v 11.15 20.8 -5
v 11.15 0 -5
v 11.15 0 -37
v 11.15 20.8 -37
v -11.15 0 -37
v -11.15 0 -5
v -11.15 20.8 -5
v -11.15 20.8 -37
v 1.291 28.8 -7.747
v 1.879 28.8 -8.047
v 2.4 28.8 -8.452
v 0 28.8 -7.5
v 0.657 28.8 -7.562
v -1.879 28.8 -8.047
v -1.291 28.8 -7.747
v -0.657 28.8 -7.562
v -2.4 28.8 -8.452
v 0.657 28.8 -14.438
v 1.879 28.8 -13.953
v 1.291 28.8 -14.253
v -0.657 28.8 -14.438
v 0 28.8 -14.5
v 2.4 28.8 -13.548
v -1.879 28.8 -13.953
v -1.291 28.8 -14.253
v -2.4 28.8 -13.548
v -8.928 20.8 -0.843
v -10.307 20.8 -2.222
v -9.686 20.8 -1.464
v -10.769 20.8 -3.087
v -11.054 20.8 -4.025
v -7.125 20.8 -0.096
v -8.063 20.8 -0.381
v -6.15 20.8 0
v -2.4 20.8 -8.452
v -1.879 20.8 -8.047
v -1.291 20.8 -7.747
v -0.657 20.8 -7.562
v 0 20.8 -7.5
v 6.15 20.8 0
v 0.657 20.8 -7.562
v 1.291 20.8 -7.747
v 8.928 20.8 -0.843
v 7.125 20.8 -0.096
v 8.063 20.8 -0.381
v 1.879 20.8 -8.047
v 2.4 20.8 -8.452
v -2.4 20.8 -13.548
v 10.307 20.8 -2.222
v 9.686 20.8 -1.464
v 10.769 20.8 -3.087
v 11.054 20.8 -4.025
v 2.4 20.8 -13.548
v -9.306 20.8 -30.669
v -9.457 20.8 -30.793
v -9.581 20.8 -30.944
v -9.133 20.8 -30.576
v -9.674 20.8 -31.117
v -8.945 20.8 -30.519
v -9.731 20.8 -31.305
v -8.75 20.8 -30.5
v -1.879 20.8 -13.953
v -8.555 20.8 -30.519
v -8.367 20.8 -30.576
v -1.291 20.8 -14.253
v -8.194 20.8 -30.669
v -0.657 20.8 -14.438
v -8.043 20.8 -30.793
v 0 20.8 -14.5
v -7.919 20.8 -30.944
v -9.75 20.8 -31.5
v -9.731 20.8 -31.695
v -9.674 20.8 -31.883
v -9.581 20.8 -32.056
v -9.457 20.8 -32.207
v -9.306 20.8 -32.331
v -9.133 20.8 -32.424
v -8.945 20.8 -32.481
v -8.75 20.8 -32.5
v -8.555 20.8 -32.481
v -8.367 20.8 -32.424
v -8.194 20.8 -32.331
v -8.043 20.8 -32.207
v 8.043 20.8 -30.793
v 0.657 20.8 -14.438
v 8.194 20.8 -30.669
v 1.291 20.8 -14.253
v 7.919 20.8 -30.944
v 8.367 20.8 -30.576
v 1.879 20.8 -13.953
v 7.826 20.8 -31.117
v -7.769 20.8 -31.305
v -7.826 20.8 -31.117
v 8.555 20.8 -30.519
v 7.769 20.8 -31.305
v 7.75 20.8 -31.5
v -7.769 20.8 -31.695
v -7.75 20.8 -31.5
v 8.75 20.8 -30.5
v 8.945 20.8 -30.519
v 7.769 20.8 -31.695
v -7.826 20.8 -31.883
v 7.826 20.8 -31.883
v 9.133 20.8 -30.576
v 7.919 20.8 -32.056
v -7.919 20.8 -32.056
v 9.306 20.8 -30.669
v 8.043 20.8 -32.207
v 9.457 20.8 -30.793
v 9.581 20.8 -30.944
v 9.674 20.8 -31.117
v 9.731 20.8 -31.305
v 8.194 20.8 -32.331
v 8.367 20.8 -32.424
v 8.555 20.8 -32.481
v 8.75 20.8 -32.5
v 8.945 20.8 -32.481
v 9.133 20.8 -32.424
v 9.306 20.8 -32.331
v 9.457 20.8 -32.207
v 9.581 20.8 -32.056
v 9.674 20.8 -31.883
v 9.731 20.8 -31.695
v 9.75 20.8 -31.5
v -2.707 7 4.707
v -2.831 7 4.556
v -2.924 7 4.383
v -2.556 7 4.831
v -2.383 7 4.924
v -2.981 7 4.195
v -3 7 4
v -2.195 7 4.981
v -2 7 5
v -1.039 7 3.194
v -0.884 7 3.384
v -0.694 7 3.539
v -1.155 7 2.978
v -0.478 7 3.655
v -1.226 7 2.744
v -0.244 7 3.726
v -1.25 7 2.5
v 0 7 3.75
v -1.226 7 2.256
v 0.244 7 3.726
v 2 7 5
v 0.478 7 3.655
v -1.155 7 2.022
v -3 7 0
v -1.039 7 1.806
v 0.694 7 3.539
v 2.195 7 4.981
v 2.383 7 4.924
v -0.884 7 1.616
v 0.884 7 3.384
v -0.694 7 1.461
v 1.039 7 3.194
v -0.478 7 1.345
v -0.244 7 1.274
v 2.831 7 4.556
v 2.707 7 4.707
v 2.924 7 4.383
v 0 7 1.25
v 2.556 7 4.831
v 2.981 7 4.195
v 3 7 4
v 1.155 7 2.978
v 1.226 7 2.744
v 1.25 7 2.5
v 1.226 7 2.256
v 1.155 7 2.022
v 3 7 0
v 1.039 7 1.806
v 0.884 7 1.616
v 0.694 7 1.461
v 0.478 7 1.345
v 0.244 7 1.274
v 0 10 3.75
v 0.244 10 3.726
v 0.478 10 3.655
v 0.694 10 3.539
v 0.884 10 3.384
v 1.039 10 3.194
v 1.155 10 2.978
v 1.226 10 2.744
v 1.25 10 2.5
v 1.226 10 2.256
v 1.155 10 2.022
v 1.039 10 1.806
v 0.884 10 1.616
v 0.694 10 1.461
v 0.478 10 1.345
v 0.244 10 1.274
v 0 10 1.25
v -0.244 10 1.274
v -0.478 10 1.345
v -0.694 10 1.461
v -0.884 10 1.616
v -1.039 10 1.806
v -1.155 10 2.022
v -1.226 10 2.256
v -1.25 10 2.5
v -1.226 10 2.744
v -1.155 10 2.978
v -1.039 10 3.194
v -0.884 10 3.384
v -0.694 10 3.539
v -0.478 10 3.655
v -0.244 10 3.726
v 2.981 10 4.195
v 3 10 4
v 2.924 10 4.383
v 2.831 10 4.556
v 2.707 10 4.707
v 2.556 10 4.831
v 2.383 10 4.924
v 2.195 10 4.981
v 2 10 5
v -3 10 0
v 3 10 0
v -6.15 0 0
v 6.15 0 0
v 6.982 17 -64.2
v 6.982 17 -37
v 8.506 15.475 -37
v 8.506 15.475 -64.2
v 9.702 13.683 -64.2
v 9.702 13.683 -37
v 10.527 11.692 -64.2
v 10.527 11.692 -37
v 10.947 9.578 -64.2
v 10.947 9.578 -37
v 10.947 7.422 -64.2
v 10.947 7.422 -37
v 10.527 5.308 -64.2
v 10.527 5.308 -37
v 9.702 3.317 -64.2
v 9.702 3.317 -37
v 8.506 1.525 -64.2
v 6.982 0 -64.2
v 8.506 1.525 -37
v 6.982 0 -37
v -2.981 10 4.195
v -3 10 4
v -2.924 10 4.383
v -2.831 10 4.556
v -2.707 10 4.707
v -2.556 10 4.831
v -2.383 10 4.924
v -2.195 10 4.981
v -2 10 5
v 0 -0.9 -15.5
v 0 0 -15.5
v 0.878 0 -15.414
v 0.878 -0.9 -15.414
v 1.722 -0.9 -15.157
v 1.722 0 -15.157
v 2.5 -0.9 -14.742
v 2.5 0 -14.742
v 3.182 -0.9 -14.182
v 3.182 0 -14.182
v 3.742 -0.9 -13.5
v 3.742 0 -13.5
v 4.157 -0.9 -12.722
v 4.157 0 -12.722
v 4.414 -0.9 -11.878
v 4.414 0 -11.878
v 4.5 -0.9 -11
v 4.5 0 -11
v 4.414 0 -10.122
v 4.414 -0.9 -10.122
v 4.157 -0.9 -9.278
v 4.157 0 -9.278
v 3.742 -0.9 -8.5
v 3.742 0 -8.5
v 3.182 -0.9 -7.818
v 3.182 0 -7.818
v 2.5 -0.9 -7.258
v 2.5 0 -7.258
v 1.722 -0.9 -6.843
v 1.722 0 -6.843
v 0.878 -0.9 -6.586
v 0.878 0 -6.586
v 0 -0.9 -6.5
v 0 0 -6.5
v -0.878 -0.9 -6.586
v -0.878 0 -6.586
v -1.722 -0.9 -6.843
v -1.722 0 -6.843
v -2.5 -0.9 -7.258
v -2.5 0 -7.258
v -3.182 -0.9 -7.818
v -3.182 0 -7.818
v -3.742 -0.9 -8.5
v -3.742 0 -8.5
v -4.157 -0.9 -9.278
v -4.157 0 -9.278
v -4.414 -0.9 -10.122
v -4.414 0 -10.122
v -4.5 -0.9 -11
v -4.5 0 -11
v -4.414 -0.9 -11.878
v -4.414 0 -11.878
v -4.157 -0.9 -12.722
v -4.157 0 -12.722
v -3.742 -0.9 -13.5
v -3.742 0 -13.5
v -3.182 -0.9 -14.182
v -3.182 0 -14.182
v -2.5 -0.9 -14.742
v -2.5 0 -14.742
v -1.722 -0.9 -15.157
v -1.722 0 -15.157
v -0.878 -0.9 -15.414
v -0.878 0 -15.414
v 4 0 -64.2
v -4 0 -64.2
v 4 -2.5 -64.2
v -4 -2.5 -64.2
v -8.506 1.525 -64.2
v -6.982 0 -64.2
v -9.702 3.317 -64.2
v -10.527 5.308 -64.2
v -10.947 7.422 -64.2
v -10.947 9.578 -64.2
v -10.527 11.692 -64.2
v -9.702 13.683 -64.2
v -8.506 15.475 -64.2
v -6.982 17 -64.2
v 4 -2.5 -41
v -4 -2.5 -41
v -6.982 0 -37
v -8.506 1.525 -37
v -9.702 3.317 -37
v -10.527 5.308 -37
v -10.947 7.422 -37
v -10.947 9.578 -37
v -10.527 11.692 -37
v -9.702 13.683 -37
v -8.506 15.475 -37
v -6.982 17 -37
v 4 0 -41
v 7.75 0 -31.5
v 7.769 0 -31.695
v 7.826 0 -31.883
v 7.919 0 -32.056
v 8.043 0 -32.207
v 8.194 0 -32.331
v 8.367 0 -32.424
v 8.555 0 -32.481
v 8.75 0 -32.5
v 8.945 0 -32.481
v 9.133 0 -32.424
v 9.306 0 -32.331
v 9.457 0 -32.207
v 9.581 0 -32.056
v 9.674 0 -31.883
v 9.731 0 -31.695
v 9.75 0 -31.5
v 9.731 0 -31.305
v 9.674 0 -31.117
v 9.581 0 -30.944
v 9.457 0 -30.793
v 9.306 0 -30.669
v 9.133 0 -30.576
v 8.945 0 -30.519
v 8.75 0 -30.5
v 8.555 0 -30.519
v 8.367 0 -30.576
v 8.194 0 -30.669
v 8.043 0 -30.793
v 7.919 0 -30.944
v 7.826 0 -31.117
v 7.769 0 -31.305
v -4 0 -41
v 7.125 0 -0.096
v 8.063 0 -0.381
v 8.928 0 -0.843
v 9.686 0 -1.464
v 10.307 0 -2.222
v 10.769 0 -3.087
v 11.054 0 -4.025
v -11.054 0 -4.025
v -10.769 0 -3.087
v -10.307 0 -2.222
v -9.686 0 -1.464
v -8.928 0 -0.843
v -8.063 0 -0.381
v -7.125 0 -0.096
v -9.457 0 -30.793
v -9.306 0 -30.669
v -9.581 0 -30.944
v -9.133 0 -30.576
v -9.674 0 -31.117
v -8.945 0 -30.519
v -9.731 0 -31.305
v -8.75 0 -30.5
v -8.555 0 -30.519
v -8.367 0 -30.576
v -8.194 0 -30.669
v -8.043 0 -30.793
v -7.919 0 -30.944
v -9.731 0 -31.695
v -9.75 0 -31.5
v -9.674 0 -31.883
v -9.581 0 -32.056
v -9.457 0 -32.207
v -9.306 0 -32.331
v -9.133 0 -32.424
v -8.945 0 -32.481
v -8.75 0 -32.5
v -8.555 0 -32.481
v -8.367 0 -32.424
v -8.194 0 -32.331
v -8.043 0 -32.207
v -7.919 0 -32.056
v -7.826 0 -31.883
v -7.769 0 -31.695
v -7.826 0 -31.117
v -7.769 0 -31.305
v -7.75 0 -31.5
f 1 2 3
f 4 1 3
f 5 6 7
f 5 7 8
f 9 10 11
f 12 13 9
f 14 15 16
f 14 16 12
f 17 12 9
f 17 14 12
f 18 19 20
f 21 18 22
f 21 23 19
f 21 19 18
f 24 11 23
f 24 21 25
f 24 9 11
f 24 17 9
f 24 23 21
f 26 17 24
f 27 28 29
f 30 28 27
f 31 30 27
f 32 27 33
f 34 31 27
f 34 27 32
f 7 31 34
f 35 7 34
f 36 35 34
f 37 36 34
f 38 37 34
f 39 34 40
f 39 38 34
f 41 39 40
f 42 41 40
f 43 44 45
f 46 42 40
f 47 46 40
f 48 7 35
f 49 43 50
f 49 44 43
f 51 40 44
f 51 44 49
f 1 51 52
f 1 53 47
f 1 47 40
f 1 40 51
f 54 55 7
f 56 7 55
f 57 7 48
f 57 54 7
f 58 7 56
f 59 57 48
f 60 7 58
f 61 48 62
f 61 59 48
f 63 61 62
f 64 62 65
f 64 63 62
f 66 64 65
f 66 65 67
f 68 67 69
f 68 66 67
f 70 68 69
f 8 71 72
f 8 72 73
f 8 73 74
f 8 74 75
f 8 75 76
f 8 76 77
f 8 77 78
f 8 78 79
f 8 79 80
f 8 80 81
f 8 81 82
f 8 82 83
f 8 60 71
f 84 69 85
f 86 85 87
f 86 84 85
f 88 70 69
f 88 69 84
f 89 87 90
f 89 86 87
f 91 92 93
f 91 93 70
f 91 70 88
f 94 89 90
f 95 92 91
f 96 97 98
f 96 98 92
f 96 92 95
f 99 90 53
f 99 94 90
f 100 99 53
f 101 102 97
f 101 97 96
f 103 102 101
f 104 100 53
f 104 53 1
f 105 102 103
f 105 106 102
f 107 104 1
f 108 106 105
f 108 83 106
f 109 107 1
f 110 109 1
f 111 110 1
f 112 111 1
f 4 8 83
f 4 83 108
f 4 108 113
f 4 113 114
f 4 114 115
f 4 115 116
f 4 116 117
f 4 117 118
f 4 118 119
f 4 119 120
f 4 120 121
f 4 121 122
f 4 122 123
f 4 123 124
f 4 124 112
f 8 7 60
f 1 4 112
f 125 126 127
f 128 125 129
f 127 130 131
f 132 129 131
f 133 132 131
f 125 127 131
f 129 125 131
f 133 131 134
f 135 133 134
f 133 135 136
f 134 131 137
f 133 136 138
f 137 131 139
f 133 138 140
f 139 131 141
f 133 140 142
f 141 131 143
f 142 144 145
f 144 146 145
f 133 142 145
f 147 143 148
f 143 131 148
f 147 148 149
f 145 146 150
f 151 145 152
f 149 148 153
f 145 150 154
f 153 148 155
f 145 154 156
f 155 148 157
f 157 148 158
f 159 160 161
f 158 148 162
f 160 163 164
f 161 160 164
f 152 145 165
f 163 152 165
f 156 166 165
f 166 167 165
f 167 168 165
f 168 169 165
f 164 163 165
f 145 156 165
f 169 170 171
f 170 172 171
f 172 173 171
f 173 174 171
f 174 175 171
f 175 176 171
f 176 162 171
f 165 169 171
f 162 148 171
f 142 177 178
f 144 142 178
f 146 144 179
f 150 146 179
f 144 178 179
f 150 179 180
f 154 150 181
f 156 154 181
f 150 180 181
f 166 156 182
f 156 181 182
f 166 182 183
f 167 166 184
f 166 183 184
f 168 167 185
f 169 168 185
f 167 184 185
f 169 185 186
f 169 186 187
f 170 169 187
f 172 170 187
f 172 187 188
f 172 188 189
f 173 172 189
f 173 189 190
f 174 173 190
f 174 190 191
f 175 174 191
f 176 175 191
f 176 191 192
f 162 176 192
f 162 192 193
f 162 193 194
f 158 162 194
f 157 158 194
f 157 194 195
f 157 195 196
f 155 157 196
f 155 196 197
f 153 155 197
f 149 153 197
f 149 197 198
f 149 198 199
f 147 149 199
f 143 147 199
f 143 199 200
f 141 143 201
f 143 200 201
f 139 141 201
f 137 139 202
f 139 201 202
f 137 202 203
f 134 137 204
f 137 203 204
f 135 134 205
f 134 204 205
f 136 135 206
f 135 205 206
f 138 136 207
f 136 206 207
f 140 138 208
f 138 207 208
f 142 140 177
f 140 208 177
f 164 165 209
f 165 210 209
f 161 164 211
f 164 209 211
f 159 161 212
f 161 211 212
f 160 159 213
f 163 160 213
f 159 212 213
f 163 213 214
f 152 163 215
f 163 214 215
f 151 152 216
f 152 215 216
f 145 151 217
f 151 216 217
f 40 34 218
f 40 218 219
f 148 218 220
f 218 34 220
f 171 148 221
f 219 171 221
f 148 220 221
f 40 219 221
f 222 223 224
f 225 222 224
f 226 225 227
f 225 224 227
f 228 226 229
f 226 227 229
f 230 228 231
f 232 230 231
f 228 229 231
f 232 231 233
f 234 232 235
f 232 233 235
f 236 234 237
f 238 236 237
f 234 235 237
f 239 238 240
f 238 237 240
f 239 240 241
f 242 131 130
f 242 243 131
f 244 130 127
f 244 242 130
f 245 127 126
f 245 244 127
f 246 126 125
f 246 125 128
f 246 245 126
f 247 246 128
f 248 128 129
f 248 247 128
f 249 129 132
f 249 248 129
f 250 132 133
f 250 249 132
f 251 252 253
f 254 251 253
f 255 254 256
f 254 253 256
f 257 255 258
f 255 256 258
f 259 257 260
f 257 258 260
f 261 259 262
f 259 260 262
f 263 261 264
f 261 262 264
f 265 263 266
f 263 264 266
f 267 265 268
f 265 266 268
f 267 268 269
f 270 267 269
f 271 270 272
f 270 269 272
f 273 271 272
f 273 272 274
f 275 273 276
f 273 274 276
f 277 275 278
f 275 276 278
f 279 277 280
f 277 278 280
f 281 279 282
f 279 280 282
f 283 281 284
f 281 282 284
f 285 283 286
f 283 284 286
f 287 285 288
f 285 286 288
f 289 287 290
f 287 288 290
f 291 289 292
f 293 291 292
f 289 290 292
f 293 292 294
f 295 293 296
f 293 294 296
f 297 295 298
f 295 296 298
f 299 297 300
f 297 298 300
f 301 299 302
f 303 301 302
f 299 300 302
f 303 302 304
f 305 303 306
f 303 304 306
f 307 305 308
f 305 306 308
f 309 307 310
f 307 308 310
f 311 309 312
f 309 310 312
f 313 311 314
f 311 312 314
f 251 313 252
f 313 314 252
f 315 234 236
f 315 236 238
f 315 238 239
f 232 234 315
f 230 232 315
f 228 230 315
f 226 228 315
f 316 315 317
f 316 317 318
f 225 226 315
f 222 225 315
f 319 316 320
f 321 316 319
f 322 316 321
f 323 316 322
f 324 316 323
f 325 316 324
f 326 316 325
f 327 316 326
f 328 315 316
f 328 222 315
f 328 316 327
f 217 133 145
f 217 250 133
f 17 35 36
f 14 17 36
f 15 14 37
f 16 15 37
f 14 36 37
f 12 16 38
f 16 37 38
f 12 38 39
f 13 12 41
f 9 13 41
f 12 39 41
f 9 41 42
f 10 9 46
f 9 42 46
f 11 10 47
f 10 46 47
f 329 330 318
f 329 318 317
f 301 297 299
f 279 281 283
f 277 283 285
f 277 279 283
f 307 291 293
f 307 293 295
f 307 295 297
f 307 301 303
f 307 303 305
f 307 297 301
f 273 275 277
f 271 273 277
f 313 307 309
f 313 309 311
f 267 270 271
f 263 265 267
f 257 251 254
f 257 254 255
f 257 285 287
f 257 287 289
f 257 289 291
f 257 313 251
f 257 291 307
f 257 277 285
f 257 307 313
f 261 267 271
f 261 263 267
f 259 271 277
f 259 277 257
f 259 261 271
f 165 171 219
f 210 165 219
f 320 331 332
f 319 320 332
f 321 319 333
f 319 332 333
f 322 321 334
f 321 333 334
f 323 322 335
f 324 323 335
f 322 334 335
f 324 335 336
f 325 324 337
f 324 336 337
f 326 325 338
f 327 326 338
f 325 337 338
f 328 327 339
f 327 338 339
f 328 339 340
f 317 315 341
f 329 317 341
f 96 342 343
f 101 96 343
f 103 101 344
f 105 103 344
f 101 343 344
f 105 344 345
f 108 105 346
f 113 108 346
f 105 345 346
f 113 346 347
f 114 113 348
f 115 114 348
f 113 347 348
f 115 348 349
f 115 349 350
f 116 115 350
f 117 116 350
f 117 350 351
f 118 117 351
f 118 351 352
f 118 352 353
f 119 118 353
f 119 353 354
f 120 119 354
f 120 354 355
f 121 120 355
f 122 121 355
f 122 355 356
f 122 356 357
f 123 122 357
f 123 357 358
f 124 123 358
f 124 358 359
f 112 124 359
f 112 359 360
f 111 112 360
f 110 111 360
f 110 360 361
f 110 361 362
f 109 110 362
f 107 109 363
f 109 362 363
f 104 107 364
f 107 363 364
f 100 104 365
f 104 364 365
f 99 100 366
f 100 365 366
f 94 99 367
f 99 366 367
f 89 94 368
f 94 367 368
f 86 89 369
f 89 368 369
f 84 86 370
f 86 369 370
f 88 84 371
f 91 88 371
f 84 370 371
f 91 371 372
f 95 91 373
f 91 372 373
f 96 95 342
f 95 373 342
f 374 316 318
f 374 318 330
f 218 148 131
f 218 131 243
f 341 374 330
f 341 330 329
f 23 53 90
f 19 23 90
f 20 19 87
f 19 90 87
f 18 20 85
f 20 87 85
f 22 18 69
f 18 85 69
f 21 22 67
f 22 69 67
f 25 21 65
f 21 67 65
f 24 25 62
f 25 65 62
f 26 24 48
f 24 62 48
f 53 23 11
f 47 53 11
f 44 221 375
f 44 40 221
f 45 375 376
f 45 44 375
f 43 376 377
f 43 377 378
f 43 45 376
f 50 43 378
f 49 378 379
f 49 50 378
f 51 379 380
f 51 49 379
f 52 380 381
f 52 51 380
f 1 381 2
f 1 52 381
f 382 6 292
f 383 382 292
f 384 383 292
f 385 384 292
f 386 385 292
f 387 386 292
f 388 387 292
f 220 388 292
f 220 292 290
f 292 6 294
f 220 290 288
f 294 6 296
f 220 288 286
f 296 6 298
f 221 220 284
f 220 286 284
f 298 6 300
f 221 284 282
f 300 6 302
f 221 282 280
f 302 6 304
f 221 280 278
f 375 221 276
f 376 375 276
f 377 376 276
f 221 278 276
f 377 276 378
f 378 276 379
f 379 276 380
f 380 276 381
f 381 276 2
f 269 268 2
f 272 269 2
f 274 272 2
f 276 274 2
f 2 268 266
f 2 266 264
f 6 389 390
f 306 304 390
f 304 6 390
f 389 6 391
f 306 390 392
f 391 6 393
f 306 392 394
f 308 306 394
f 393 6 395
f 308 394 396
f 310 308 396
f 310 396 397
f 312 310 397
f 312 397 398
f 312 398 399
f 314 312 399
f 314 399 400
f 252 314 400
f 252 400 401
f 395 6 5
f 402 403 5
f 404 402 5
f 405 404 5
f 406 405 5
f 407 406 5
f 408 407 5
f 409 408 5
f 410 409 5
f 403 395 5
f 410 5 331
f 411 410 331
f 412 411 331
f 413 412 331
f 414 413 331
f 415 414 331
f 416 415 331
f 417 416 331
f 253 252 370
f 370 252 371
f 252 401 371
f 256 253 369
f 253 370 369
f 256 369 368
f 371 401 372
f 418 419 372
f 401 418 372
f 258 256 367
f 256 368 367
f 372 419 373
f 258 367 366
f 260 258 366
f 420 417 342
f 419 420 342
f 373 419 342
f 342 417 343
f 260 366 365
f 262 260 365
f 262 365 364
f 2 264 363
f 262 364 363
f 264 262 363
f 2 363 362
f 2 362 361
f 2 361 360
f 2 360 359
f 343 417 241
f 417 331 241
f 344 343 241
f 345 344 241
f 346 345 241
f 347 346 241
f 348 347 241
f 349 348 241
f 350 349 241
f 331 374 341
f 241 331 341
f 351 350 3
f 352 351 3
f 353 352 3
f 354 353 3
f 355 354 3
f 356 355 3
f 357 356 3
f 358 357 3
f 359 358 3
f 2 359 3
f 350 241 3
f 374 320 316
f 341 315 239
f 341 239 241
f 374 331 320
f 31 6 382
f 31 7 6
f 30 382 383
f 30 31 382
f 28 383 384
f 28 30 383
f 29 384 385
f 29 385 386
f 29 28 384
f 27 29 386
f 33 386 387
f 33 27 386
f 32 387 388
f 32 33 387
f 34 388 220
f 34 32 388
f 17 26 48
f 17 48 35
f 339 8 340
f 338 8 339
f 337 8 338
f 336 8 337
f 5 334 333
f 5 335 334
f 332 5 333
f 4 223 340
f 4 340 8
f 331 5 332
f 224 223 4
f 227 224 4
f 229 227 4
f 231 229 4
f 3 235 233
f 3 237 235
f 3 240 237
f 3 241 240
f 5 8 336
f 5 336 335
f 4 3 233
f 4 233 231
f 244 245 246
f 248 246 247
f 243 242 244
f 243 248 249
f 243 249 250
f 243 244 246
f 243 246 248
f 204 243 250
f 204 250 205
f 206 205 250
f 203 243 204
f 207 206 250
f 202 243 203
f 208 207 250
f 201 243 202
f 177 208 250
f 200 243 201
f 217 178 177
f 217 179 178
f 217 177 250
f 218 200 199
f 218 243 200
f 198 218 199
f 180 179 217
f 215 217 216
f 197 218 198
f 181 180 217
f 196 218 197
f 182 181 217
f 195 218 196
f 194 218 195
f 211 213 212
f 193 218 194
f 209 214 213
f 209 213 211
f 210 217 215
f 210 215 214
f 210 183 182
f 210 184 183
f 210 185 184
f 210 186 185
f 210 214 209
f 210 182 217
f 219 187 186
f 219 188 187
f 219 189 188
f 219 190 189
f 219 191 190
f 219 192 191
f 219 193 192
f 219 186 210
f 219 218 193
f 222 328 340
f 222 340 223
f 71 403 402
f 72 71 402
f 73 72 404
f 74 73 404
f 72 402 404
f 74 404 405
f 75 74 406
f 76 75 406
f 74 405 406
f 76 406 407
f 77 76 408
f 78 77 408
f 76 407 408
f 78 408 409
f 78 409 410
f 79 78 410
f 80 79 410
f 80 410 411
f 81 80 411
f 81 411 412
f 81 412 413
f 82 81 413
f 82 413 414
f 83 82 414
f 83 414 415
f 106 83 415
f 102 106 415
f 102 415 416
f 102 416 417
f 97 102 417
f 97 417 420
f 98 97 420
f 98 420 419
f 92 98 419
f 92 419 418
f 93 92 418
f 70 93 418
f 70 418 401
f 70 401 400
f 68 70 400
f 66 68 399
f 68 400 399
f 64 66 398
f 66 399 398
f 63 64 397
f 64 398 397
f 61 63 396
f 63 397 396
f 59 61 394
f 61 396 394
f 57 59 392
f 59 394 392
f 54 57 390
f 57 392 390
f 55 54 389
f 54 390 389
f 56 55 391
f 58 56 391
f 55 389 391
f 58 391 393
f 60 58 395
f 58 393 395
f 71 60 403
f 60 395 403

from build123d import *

# Parameters (mm, degrees)
SKETCH1_W             = 22.3
SKETCH1_H             = 37
BOSS_EXTRUDE1_DEPTH   = 20.8
FILLET1_R             = 5
BOSS_EXTRUDE2_DEPTH   = 27.2
SKETCH3_R             = 3.5
BOSS_EXTRUDE3_DEPTH   = 8
CUT_EXTRUDE1_START    = -8
CUT_EXTRUDE1_DEPTH    = 8
SKETCH5_W             = 6
SKETCH5_H             = 3
BOSS_EXTRUDE4_DEPTH   = 5
CUT_EXTRUDE2_REACH    = 69.819
SKETCH7_R             = 1.25
FILLET2_R             = 1
F_2_0MM_DOWEL_HOLE1_D = 2
SKETCH10_W            = 8
SKETCH10_H            = 23.2
BOSS_EXTRUDE5_DEPTH   = 2.5
SKETCH11_R            = 4.5
BOSS_EXTRUDE6_DEPTH   = 0.9


with BuildPart() as part:
    # Sketch1 → Boss-Extrude1 (new body)
    with BuildSketch(Plane(origin=(0, 0, 0), x_dir=(1, 0, 0), z_dir=(0, 1, 0))):
        with Locations((0, 18.5)):
            Rectangle(SKETCH1_W, SKETCH1_H)
    extrude(amount=BOSS_EXTRUDE1_DEPTH)

    # Fillet1
    fillet1_edges = [part.edges().sort_by_distance(p)[0] for p in [
        (11.15, 10.4, 0),
        (-11.15, 10.4, 0),
    ]]
    fillet(fillet1_edges, radius=FILLET1_R)

    # Sketch2 → Boss-Extrude2 (add)
    with BuildSketch(Plane(origin=(0, 0, -37), x_dir=(-1, 0, 0), z_dir=(0, 0, -1))):
        with BuildLine():
            Line((-6.982120022, 0), (6.982120022, 0))
            ThreePointArc((6.982120022, 0), (11, 8.5), (6.982120022, 17))
            Line((6.982120022, 17), (-6.982120022, 17))
            ThreePointArc((-6.982120022, 17), (-11, 8.5), (-6.982120022, 0))
        make_face()
    extrude(amount=BOSS_EXTRUDE2_DEPTH)

    # Sketch3 → Boss-Extrude3 (add)
    with BuildSketch(Plane(origin=(0, 20.8, 0), x_dir=(1, 0, 0), z_dir=(0, 1, 0))):
        with Locations(Location((0, 11, 0), (0, 0, 90))):
            Circle(SKETCH3_R)
    extrude(amount=BOSS_EXTRUDE3_DEPTH)

    # Sketch4 → Cut-Extrude1 (cut)
    with BuildSketch(Plane(origin=(0, 28.8, 0), x_dir=(1, 0, 0), z_dir=(0, 1, 0)).offset(CUT_EXTRUDE1_START)):
        with BuildLine():
            Line((-2.4, 13.547547841), (-2.4, 8.452452159))
            ThreePointArc((-2.4, 8.452452159), (-3.5, 11), (-2.4, 13.547547841))
        make_face()
        with BuildLine():
            Line((2.4, 13.547547841), (2.4, 8.452452159))
            ThreePointArc((2.4, 8.452452159), (3.5, 11), (2.4, 13.547547841))
        make_face()
    extrude(amount=CUT_EXTRUDE1_DEPTH, mode=Mode.SUBTRACT)

    # Sketch5 → Boss-Extrude4 (add)
    with BuildSketch(Plane.XY):
        with Locations((0, 8.5)):
            Rectangle(SKETCH5_W, SKETCH5_H)
    extrude(amount=BOSS_EXTRUDE4_DEPTH)

    # Sketch7 → Cut-Extrude2 (cut, up to next)
    with BuildSketch(Plane(origin=(0, 10, 0), x_dir=(1, 0, 0), z_dir=(0, 1, 0)), mode=Mode.PRIVATE) as cut_extrude2_sk1:
        with Locations(Location((0, -2.5, 0), (0, 0, 270))):
            Circle(SKETCH7_R)
    cut_extrude2_tool1 = extrude(cut_extrude2_sk1.sketch, amount=-CUT_EXTRUDE2_REACH, mode=Mode.PRIVATE) & part.part
    add(cut_extrude2_tool1.solids().sort_by_distance((0, 10, 2.5))[0], mode=Mode.SUBTRACT)

    # Fillet2
    fillet2_edges = [part.edges().sort_by_distance(p)[0] for p in [
        (3, 8.5, 5),
        (-3, 8.5, 5),
    ]]
    fillet(fillet2_edges, radius=FILLET2_R)

    # Ø2.0mm Dowel Hole1 (through all)
    with Locations(Plane(origin=(0, 20.8, 0), x_dir=(1, 0, 0), z_dir=(0, 1, 0))):
        with Locations((-8.75, 31.5), (8.75, 31.5)):
            Hole(F_2_0MM_DOWEL_HOLE1_D / 2)

    # Sketch10 → Boss-Extrude5 (add)
    with BuildSketch(Plane.XZ):
        with Locations((0, -52.6)):
            Rectangle(SKETCH10_W, SKETCH10_H)
    extrude(amount=BOSS_EXTRUDE5_DEPTH)

    # Sketch11 → Boss-Extrude6 (add)
    with BuildSketch(Plane.XZ):
        with Locations(Location((0, -11, 0), (0, 0, 270))):
            Circle(SKETCH11_R)
    extrude(amount=BOSS_EXTRUDE6_DEPTH)


solid = part.part
